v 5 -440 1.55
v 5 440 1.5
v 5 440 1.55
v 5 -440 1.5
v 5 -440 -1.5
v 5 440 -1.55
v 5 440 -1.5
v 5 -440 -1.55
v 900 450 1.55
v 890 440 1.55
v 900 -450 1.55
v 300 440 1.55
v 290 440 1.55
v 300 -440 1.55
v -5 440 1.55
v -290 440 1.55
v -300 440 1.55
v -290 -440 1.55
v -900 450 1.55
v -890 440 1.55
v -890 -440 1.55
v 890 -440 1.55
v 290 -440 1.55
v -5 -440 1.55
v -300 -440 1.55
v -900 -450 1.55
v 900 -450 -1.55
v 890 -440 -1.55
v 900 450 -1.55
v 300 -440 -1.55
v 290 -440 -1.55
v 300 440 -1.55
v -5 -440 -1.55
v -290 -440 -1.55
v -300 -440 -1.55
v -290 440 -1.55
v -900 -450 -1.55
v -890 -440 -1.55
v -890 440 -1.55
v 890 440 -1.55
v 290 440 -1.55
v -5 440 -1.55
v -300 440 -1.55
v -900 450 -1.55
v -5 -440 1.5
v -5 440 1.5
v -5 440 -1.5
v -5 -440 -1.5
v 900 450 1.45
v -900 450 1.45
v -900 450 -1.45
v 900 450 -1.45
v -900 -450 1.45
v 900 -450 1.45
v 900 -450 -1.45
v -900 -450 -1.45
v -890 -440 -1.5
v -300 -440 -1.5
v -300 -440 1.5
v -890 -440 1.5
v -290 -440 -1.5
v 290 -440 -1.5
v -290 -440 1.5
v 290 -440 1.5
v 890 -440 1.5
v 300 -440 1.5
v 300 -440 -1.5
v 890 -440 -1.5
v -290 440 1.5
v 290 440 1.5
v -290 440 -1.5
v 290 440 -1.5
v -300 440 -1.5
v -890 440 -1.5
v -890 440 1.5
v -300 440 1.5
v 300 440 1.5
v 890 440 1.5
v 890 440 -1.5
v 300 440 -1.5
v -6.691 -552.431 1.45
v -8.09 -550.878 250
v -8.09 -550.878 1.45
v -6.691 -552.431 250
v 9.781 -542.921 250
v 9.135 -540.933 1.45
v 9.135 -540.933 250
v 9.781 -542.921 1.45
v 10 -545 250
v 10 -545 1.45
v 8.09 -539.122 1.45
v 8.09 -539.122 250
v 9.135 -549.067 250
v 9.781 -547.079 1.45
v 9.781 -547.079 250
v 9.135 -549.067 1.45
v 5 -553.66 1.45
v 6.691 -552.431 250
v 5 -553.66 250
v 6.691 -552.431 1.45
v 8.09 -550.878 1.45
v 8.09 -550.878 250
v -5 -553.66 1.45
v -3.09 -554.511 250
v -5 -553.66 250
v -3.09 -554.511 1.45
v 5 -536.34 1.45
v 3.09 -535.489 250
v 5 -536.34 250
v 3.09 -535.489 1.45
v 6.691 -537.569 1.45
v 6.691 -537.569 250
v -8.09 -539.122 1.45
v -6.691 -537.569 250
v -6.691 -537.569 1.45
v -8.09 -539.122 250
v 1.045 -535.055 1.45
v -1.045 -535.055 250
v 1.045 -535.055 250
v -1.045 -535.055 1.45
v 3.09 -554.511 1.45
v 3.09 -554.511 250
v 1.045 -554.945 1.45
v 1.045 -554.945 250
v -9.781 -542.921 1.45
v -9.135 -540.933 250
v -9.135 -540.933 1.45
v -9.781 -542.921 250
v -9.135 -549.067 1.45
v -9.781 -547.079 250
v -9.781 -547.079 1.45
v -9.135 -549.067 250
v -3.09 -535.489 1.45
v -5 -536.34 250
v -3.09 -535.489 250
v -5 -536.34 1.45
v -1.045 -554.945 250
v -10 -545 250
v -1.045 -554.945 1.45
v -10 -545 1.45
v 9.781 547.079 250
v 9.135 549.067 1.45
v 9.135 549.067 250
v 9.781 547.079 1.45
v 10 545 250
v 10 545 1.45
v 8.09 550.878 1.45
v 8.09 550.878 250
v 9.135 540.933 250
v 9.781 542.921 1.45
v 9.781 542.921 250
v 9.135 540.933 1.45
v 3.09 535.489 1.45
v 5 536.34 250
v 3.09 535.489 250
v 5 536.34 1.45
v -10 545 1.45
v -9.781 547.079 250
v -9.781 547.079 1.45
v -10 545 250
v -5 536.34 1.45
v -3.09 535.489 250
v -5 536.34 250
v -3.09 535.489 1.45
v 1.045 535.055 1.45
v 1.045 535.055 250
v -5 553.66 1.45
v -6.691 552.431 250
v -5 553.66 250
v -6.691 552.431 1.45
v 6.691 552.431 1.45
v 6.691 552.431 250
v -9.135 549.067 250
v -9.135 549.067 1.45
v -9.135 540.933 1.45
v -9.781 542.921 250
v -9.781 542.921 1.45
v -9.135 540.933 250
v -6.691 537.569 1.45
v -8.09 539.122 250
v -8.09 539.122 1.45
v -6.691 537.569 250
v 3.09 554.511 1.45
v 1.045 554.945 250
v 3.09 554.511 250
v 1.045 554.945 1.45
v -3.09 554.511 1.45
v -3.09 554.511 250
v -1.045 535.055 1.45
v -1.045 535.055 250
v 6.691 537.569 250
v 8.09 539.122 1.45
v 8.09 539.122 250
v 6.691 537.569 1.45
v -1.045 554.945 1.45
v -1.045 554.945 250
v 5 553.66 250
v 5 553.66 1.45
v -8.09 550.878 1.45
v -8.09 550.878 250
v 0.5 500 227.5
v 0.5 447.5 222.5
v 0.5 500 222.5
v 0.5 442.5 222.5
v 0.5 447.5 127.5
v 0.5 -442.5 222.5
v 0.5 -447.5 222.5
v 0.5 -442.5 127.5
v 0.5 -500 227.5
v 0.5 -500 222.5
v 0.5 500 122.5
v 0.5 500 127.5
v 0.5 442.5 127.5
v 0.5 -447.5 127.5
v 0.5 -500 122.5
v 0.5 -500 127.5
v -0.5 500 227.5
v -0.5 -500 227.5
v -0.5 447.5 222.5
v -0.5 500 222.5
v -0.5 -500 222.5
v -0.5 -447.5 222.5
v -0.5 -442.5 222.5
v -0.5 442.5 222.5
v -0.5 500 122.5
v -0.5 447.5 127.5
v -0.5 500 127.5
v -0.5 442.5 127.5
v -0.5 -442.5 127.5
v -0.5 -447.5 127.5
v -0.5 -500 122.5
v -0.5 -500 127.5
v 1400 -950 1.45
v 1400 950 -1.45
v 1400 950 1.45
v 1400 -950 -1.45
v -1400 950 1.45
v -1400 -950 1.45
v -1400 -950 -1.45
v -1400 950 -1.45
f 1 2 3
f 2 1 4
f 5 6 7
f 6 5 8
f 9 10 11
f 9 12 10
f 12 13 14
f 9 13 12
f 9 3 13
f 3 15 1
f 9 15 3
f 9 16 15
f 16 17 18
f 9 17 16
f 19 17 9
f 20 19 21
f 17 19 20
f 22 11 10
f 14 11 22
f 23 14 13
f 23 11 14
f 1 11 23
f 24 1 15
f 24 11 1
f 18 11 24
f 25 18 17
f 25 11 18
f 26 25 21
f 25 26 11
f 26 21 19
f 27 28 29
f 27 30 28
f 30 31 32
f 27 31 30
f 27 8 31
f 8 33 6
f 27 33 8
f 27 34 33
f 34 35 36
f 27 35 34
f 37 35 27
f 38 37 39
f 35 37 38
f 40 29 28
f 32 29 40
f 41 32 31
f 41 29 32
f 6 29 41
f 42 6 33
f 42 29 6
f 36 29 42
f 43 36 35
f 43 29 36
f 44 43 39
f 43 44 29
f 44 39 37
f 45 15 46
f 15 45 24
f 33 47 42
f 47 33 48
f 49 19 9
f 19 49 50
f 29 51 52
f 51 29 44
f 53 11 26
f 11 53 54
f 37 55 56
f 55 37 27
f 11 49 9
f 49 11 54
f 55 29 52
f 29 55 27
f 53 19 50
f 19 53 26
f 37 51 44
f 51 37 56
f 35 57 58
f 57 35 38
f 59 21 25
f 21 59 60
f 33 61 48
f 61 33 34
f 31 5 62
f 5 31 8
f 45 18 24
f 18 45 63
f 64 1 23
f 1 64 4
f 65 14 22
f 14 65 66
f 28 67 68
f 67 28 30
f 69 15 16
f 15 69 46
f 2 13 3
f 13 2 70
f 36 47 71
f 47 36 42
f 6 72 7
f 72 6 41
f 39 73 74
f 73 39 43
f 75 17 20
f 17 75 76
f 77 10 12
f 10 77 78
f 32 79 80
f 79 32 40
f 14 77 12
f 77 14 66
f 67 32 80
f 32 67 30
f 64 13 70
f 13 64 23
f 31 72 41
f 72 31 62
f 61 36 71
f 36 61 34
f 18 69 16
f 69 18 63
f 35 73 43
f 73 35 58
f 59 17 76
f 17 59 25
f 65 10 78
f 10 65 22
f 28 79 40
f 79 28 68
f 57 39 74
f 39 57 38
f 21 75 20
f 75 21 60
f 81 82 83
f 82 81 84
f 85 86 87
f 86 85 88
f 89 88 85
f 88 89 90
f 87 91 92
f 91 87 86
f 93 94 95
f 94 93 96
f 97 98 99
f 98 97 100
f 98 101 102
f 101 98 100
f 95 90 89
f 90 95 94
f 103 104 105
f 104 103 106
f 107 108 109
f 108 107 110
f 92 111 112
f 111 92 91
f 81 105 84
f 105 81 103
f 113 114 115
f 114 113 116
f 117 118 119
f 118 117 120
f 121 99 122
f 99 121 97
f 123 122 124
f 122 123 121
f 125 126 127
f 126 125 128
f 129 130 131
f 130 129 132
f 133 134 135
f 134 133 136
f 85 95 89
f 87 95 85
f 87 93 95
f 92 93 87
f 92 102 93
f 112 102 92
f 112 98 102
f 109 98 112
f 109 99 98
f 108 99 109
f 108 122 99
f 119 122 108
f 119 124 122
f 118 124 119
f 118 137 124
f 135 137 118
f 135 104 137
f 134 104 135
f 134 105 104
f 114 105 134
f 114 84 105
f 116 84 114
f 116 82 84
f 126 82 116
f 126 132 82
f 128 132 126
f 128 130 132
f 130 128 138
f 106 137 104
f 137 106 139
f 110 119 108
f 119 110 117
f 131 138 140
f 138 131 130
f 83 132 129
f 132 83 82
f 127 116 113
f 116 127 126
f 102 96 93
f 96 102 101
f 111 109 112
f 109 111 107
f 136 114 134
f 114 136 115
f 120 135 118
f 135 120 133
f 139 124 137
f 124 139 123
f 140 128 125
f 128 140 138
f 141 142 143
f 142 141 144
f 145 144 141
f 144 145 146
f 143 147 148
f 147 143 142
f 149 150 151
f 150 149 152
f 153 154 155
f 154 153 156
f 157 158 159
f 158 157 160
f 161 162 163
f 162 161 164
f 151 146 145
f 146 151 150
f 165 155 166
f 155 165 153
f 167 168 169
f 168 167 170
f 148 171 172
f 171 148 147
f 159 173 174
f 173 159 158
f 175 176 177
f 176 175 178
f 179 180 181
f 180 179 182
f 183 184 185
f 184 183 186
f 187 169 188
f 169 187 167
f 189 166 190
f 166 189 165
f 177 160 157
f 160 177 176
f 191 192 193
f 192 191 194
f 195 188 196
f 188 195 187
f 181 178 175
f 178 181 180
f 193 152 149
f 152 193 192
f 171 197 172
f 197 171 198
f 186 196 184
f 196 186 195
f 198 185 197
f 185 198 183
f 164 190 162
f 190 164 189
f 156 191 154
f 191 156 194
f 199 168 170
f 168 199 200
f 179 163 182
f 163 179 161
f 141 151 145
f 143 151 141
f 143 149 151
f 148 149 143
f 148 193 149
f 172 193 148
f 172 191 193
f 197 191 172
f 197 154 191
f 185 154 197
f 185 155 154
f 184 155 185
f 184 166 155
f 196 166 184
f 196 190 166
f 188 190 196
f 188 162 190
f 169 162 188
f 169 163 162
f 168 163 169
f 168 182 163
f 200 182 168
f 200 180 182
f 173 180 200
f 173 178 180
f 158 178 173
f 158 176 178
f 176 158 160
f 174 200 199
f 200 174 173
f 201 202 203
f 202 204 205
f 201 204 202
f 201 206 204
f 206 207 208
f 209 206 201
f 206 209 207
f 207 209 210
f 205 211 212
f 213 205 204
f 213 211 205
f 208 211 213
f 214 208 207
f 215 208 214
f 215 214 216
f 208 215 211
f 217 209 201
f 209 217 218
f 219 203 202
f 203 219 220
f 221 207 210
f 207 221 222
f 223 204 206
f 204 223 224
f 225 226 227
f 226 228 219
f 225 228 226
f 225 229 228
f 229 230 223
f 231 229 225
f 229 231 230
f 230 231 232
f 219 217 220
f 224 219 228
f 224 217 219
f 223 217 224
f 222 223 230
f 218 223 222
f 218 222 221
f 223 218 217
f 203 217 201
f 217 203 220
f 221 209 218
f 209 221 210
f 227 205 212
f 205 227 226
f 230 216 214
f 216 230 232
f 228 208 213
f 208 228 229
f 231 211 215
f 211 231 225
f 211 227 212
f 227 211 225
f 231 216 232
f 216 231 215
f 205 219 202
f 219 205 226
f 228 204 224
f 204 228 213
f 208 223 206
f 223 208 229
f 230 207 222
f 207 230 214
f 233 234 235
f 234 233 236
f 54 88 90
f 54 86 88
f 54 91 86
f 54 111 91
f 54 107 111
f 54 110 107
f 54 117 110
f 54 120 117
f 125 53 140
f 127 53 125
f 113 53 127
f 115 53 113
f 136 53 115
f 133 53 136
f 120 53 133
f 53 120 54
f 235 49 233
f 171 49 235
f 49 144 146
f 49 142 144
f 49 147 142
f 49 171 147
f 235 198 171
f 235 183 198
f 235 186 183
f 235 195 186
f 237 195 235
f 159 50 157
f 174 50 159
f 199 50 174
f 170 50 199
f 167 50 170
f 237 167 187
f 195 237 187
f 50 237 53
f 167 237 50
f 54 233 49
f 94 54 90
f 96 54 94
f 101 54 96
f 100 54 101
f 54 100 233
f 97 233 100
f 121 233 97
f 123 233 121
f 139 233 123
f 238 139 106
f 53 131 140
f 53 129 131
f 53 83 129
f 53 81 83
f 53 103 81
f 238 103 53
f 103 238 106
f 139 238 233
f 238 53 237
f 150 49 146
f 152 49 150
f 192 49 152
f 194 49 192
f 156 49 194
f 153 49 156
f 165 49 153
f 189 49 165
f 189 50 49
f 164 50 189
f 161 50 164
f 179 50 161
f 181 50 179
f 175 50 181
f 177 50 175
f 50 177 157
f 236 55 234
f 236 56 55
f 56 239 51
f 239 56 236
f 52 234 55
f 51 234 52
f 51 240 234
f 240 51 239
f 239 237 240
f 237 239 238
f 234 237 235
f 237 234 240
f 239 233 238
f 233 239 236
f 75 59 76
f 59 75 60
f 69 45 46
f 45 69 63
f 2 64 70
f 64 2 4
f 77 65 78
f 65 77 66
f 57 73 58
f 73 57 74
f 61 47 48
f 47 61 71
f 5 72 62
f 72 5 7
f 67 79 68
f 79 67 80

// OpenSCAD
union() {
    // Fondo
    color("lightblue")
        cube([2800, 1900, 2.9], center=true);
    
    // Campo di gioco
    color("yellow")
        cube([1800, 900, 3], center=true);
    
    // Linee
    color("white") {
        cube([10, 900, 3.1], center = true);
        translate([0,-445, 0])
            cube([1800, 10, 3.1], center=true);
        translate([0, 445, 0])
            cube([1800, 10, 3.1], center=true);
        translate([0, 445, 0])
            cube([1800, 10, 3.1], center=true);
           
        translate([295, 0, 0])
            cube([10, 900, 3.1], center = true);
        translate([-295, 0, 0])
            cube([10, 900, 3.1], center = true);
           
        translate([895, 0, 0])
            cube([10, 900, 3.1], center = true);
        translate([-895, 0, 0])
            cube([10, 900, 3.1], center = true);
    }
    // Pali
    color("blue") {
        translate([0,-545, 0])
            cylinder(d=20, h=250);
        translate([0, 545, 0])
            cylinder(d=20, h=250);
    }
    
    // Rete
    color("white") {// Bande
        translate([0, 0, 225])
            cube([1, 1000, 5], center=true);
        translate([0, 0, 125])
            cube([1, 1000, 5], center=true);
         translate([0, 445, 175])
            cube([1, 5, 100], center=true);
         translate([0,-445, 175])
            cube([1, 5, 100], center=true);
  }
  color("red") {
  }
}
